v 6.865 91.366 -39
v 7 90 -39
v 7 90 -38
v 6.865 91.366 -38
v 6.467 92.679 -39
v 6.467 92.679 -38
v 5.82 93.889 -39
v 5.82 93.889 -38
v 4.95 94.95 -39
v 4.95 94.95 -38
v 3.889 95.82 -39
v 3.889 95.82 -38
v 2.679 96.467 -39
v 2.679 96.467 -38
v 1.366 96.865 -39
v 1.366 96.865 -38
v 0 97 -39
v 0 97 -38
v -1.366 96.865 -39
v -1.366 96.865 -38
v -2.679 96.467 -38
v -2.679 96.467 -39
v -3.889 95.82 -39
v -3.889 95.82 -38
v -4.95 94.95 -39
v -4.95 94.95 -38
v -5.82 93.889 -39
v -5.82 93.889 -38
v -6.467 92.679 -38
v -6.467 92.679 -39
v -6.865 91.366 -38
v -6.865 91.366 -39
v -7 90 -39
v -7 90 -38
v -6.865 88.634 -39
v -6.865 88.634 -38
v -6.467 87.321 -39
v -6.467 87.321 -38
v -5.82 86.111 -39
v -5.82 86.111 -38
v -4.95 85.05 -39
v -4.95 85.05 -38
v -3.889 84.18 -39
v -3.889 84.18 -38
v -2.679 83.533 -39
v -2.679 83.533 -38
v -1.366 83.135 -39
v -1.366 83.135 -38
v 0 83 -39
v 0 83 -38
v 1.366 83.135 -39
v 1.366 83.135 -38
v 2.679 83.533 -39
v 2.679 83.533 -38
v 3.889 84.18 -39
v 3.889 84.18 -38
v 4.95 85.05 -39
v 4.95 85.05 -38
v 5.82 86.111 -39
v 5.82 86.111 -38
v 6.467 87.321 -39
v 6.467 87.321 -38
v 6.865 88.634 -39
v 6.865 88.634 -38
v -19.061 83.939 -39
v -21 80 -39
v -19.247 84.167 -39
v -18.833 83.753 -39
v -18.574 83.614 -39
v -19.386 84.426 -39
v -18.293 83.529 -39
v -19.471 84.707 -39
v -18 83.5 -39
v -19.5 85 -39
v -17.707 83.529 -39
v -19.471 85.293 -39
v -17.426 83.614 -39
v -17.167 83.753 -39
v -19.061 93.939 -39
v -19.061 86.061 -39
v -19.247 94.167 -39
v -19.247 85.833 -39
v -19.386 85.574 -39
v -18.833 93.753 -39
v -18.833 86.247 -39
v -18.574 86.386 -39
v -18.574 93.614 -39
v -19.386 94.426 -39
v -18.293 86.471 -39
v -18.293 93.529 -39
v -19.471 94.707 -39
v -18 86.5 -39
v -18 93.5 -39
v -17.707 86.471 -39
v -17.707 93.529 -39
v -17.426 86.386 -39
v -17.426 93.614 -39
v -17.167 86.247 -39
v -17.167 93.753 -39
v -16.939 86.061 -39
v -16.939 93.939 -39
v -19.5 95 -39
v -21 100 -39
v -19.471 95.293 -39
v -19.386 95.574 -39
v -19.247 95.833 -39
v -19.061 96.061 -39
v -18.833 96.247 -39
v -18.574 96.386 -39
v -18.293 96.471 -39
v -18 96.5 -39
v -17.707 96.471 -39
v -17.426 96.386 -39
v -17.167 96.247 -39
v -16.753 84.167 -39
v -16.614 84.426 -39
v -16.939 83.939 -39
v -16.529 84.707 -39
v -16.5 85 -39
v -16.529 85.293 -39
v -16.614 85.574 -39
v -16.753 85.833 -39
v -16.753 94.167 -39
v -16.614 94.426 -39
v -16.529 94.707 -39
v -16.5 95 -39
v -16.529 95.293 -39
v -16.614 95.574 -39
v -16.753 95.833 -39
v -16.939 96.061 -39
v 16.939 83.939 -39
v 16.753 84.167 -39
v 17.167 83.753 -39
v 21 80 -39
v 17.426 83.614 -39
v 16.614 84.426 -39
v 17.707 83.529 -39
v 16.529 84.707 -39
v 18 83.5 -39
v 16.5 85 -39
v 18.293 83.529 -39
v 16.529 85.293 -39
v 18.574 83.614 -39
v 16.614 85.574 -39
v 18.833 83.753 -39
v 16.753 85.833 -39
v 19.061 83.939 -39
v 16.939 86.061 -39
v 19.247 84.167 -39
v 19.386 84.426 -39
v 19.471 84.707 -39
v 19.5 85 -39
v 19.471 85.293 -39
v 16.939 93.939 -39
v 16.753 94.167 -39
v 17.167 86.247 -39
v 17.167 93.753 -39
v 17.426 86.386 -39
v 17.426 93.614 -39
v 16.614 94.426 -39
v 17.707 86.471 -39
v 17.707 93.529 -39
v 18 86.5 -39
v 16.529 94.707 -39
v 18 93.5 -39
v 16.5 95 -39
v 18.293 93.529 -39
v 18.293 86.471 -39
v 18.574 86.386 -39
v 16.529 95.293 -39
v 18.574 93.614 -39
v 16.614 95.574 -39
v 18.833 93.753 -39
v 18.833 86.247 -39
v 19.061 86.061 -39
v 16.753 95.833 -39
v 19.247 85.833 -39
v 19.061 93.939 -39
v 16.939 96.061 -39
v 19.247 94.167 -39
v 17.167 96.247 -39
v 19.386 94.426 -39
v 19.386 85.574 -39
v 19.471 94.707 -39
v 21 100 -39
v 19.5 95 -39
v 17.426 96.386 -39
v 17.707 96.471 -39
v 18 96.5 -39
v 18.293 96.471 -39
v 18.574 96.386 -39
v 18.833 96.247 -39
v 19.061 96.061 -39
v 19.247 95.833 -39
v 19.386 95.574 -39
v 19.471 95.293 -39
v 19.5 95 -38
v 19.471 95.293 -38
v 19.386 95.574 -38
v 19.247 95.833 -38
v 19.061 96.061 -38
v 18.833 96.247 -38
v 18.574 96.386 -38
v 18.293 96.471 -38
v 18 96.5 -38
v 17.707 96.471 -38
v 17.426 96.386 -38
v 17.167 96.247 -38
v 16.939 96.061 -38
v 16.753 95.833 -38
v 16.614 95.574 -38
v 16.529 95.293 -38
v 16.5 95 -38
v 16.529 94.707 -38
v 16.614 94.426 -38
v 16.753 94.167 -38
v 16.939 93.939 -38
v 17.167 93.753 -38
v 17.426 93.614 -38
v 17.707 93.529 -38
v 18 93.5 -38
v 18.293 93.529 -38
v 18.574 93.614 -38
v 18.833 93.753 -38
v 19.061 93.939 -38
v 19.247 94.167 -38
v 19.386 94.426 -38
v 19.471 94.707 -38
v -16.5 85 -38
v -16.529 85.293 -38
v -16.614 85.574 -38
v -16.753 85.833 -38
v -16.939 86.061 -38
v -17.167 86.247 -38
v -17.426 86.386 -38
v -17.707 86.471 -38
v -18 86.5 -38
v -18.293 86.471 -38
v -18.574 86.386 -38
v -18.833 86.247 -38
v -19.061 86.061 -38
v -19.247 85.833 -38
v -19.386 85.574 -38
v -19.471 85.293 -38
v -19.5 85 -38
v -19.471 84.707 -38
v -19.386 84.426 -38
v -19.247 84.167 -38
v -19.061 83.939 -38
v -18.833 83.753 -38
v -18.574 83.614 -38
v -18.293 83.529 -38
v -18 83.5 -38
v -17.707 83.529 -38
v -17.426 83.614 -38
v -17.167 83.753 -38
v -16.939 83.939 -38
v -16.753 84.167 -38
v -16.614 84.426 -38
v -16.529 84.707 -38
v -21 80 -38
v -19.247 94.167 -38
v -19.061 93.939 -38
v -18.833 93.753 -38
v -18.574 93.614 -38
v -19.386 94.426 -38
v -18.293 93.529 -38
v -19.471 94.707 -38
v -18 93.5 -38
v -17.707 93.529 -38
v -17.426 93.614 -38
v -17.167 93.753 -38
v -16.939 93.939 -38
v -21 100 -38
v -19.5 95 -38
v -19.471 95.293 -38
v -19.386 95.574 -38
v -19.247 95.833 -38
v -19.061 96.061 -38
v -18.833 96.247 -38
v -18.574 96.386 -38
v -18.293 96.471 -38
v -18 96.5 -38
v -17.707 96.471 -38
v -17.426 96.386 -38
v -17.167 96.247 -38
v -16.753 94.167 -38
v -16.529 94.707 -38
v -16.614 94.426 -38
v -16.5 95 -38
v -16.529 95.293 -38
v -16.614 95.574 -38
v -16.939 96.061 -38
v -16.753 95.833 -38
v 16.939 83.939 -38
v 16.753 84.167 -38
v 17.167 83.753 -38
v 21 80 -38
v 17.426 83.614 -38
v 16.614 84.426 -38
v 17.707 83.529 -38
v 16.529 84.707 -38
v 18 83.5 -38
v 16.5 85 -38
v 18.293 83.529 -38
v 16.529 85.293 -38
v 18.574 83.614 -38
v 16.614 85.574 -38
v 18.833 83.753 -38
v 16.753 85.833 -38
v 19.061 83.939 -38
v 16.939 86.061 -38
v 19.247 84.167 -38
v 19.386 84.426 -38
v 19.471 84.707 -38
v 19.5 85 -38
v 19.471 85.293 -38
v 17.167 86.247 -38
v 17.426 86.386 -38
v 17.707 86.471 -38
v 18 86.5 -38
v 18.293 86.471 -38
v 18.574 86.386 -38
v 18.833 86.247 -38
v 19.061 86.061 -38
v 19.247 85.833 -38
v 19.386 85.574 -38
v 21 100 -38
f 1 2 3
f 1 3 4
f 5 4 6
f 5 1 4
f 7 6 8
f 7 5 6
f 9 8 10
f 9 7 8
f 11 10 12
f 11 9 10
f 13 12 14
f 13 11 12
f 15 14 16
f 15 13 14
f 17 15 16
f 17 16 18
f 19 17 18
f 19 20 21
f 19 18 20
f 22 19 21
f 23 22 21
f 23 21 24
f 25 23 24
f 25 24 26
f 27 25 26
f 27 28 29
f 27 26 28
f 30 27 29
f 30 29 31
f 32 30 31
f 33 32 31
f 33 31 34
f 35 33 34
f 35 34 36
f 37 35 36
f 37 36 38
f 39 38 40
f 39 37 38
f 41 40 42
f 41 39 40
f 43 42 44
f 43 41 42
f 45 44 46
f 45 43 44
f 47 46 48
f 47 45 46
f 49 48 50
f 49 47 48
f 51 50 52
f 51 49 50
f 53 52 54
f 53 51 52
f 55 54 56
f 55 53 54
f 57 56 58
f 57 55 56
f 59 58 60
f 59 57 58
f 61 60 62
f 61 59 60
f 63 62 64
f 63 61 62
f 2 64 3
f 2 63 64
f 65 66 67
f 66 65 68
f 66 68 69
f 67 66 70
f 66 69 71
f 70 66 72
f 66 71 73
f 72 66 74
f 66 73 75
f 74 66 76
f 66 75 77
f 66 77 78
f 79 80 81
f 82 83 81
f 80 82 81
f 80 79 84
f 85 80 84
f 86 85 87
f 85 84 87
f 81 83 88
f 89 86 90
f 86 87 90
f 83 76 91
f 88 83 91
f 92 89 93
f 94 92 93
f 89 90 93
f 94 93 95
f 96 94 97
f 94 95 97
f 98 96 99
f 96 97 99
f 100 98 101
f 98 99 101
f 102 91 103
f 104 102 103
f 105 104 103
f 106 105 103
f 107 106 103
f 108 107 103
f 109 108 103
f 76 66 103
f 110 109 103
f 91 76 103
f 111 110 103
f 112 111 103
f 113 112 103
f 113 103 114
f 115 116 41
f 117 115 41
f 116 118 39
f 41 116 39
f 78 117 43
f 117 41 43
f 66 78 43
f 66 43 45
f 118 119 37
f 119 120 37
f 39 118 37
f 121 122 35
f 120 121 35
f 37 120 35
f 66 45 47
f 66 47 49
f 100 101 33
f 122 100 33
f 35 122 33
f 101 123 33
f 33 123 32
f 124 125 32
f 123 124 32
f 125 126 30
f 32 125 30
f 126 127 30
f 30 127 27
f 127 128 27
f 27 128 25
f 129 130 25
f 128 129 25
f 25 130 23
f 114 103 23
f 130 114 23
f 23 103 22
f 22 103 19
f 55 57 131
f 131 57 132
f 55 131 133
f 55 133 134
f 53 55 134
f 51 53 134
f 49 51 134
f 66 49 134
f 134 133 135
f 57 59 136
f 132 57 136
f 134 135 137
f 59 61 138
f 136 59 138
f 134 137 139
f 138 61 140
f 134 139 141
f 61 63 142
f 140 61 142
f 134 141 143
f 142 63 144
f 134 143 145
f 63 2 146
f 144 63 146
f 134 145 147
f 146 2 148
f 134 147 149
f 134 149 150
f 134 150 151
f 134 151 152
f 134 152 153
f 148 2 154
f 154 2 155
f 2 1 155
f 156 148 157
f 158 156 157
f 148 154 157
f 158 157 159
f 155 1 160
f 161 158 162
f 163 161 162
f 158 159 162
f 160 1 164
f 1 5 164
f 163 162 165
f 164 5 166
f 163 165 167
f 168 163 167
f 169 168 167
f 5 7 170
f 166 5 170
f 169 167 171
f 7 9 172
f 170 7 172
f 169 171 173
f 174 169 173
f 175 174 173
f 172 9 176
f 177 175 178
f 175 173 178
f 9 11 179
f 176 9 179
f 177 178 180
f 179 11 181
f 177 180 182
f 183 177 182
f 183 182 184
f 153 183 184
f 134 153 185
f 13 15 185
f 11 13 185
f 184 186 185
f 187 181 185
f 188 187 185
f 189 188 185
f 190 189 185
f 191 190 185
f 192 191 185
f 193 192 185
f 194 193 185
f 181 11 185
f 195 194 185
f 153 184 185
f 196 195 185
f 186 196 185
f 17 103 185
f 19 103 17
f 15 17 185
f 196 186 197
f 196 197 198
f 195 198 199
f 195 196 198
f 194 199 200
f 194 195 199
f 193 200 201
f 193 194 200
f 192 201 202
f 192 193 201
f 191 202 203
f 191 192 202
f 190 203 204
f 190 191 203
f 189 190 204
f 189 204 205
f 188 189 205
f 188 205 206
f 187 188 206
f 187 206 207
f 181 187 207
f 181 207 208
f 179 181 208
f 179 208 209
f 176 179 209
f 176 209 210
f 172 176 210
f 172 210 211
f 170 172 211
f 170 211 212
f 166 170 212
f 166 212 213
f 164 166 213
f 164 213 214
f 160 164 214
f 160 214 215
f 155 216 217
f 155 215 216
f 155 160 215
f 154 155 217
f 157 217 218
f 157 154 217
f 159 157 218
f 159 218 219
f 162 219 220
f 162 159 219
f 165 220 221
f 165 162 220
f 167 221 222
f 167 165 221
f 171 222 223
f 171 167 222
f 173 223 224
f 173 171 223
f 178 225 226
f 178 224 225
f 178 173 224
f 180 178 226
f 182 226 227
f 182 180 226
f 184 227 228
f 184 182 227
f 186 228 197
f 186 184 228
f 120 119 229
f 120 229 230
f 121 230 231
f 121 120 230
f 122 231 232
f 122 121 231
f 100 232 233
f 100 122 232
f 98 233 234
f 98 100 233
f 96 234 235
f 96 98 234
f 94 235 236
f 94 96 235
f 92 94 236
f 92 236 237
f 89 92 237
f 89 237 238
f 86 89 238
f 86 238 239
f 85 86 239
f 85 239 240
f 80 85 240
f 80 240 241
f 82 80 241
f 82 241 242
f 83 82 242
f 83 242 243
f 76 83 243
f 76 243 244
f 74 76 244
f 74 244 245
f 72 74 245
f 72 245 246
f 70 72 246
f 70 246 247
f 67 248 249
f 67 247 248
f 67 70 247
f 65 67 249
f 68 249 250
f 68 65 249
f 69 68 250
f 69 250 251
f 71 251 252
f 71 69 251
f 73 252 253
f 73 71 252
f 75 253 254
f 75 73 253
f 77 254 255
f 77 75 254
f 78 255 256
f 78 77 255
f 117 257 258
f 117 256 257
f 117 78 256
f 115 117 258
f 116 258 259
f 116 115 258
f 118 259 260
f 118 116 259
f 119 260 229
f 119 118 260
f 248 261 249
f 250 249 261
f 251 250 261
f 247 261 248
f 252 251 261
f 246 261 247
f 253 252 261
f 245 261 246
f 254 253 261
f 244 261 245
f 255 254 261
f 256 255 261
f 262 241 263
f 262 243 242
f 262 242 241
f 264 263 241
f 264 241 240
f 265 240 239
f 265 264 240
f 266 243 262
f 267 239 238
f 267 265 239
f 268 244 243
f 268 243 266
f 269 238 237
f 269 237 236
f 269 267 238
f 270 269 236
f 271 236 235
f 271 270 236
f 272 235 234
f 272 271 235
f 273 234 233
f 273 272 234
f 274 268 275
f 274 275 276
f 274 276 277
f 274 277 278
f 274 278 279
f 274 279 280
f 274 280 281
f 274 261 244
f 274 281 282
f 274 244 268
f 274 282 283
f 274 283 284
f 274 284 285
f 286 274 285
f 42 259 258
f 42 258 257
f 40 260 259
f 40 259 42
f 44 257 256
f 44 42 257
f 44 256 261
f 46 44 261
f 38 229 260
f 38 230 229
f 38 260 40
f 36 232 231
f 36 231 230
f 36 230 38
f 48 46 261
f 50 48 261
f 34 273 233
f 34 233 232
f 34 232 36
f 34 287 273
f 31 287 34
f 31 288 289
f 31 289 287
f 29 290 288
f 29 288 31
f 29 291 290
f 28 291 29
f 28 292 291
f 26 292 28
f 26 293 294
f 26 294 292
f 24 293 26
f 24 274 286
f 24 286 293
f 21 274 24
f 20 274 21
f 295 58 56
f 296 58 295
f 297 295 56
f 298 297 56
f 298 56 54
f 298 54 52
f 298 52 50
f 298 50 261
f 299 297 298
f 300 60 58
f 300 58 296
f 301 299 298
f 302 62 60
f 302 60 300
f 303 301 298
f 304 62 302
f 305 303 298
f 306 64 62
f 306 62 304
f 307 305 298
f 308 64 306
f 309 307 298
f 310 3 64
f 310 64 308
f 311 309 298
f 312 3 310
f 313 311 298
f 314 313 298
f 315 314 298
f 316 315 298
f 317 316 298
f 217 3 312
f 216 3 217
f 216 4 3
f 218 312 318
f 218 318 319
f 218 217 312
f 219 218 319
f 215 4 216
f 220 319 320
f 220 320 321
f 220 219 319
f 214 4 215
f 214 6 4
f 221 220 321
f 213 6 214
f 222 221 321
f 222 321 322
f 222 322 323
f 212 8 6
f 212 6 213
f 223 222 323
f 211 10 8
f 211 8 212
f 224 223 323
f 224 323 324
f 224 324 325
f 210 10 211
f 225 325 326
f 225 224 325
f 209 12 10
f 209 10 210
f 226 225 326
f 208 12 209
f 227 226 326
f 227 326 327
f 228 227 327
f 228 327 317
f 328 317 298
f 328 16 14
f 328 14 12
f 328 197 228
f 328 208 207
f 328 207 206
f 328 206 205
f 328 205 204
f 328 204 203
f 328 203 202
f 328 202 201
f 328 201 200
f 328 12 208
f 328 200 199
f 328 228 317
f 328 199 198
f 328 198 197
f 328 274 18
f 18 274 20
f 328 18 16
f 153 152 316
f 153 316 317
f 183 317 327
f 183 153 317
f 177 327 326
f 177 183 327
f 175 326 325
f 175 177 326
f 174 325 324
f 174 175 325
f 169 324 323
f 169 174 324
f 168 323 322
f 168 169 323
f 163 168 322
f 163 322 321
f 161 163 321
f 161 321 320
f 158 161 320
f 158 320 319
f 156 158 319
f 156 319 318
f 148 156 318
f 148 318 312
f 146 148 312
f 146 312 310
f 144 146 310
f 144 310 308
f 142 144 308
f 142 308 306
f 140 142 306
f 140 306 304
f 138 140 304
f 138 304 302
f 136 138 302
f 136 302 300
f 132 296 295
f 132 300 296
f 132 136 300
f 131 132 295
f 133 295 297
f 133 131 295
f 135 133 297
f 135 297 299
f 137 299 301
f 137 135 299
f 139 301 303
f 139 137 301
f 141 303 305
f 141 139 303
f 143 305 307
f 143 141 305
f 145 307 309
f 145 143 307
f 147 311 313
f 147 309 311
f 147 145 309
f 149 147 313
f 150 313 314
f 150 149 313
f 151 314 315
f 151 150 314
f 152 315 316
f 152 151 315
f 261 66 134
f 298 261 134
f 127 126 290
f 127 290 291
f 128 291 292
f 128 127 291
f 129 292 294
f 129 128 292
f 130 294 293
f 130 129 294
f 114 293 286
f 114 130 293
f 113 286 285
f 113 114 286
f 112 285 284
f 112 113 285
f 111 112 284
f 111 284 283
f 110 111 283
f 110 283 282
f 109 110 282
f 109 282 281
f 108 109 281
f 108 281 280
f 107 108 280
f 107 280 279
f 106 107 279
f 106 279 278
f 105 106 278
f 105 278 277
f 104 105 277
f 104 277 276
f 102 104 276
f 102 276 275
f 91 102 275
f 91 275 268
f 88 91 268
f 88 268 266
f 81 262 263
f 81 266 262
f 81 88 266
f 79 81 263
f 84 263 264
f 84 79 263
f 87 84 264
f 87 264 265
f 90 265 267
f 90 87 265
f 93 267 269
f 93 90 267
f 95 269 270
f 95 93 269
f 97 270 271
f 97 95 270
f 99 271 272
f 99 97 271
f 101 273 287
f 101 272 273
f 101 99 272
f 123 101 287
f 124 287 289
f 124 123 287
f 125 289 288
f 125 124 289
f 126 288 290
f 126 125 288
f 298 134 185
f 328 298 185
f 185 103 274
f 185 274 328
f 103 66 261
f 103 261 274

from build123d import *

# Parameters (mm, degrees)
CYLINDER1639_R     = 1.5
CYLINDER1639_DEPTH = 60
CYLINDER1640_R     = 1.5
CYLINDER1640_DEPTH = 60
CYLINDER1641_R     = 1.5
CYLINDER1641_DEPTH = 60
CYLINDER1638_R     = 1.5
CYLINDER1638_DEPTH = 60
CYLINDER1628_R     = 7
CYLINDER1628_DEPTH = 48
BOX655_W           = 42
BOX655_H           = 20
BOX655_DEPTH       = 1


with BuildPart() as v_lec1639:
    # Cylinder1639 → Cylinder1639 (new body)
    with BuildSketch(Plane(origin=(18, 85, -57), x_dir=(1, 0, 0), z_dir=(0, 0, 1))):
        Circle(CYLINDER1639_R)
    extrude(amount=CYLINDER1639_DEPTH)


with BuildPart() as v_lec1640:
    # Cylinder1640 → Cylinder1640 (new body)
    with BuildSketch(Plane(origin=(-18, 85, -57), x_dir=(1, 0, 0), z_dir=(0, 0, 1))):
        Circle(CYLINDER1640_R)
    extrude(amount=CYLINDER1640_DEPTH)


with BuildPart() as v_lec1641:
    # Cylinder1641 → Cylinder1641 (new body)
    with BuildSketch(Plane(origin=(-18, 95, -57), x_dir=(1, 0, 0), z_dir=(0, 0, 1))):
        Circle(CYLINDER1641_R)
    extrude(amount=CYLINDER1641_DEPTH)


with BuildPart() as compound810:
    # Cylinder1638 → Cylinder1638 (new body)
    with BuildSketch(Plane(origin=(18, 95, -57), x_dir=(1, 0, 0), z_dir=(0, 0, 1))):
        Circle(CYLINDER1638_R)
    extrude(amount=CYLINDER1638_DEPTH)

    # Compound810: union Válec1639, Válec1640, Válec1641
    add(v_lec1639.part)
    add(v_lec1640.part)
    add(v_lec1641.part)


with BuildPart() as v_lec1628:
    # Cylinder1628 → Cylinder1628 (new body)
    with BuildSketch(Plane(origin=(0, 90, -55), x_dir=(1, 0, 0), z_dir=(0, 0, 1))):
        Circle(CYLINDER1628_R)
    extrude(amount=CYLINDER1628_DEPTH)


with BuildPart() as j_max_encoder_washer:
    # Box655 → Box655 (new body)
    with BuildSketch(Plane(origin=(-21, 80, -39), x_dir=(1, 0, 0), z_dir=(0, 0, 1))):
        with Locations((21, 10)):
            Rectangle(BOX655_W, BOX655_H)
    extrude(amount=BOX655_DEPTH)

    # Cut317: cut Válec1628
    add(v_lec1628.part, mode=Mode.SUBTRACT)

    # Cut322: cut Compound810
    add(compound810.part, mode=Mode.SUBTRACT)


solid = j_max_encoder_washer.part
